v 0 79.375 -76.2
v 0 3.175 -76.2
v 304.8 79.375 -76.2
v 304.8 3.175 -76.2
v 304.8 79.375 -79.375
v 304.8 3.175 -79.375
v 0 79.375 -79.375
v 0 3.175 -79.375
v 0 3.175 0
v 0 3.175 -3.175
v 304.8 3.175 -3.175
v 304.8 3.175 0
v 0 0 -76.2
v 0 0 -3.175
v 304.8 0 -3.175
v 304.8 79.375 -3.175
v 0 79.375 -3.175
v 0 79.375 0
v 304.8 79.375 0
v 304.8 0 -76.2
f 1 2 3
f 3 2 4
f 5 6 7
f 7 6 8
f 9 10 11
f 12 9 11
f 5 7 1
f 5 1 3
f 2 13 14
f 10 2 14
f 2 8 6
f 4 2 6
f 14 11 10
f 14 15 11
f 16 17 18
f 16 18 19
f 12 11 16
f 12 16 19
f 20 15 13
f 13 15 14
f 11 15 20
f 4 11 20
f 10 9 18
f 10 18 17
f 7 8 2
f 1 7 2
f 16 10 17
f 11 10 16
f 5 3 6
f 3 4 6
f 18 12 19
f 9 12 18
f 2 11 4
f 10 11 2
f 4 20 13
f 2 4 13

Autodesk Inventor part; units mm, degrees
ref_plane "YZ Plane" through (0, 0, 0) normal (1, 0, 0) x (0, 1, 0)
ref_plane "XZ Plane" through (0, 0, 0) normal (0, 1, 0) x (-1, 0, 0)
ref_plane "XY Plane" through (0, 0, 0) normal (0, 0, 1) x (1, 0, 0)
sketch "Sketch1" plane through (0, 0, 0) normal (0, 1, 0) x (-1, 0, 0)
  line L0 (0, 0) -> (-304.8, 0)
  line L1 (-304.8, 0) -> (-304.8, -76.2)
  line L2 (-304.8, -76.2) -> (0, -76.2)
  line L3 (0, -76.2) -> (0, 0)
  line L4 (0, 0) -> (-304.8, 0)
  line L5 (-304.8, 0) -> (-304.8, -3.175)
  line L6 (-304.8, -3.175) -> (0, -3.175)
  line L7 (0, -3.175) -> (0, 0)
  line L8 (0, -76.2) -> (-304.8, -76.2)
  line L9 (-304.8, -76.2) -> (-304.8, -79.375)
  line L10 (-304.8, -79.375) -> (0, -79.375)
  line L11 (0, -79.375) -> (0, -76.2)
  dimension "d0" = 304.8
  dimension "d1" = 76.2
  dimension "d2" = 304.8
  dimension "d3" = 3.175
  dimension "d4" = 304.8
  dimension "d5" = 3.175
extrude "Extrusion1" add sketch "Sketch1" along normal blind 3.175 contours L3 L2 L1 L6
sketch "Sketch2" plane through (0, 3.175, 0) normal (0, 1, 0) x (1, 0, 0)
  line L0 (0, 3.175) -> (304.8, 3.175)
  line L1 (304.8, 3.175) -> (304.8, 0)
  line L2 (304.8, 0) -> (0, 0)
  line L3 (0, 0) -> (0, 3.175)
  dimension "d8" = 304.8
  dimension "d9" = 3.175
extrude "Extrusion2" add sketch "Sketch2" along normal blind 76.2
sketch "Sketch3" plane through (0, 3.175, 0) normal (0, 1, 0) x (1, 0, 0)
  line L0 (0, 76.2) -> (304.8, 76.2)
  line L1 (304.8, 76.2) -> (304.8, 79.375)
  line L2 (304.8, 79.375) -> (0, 79.375)
  line L3 (0, 79.375) -> (0, 76.2)
  point P0 (0, 0)
  dimension "d12" = 304.8
  dimension "d13" = 3.175
extrude "Extrusion3" add sketch "Sketch3" along normal blind 76.2
properties part number "meera's skillz"
